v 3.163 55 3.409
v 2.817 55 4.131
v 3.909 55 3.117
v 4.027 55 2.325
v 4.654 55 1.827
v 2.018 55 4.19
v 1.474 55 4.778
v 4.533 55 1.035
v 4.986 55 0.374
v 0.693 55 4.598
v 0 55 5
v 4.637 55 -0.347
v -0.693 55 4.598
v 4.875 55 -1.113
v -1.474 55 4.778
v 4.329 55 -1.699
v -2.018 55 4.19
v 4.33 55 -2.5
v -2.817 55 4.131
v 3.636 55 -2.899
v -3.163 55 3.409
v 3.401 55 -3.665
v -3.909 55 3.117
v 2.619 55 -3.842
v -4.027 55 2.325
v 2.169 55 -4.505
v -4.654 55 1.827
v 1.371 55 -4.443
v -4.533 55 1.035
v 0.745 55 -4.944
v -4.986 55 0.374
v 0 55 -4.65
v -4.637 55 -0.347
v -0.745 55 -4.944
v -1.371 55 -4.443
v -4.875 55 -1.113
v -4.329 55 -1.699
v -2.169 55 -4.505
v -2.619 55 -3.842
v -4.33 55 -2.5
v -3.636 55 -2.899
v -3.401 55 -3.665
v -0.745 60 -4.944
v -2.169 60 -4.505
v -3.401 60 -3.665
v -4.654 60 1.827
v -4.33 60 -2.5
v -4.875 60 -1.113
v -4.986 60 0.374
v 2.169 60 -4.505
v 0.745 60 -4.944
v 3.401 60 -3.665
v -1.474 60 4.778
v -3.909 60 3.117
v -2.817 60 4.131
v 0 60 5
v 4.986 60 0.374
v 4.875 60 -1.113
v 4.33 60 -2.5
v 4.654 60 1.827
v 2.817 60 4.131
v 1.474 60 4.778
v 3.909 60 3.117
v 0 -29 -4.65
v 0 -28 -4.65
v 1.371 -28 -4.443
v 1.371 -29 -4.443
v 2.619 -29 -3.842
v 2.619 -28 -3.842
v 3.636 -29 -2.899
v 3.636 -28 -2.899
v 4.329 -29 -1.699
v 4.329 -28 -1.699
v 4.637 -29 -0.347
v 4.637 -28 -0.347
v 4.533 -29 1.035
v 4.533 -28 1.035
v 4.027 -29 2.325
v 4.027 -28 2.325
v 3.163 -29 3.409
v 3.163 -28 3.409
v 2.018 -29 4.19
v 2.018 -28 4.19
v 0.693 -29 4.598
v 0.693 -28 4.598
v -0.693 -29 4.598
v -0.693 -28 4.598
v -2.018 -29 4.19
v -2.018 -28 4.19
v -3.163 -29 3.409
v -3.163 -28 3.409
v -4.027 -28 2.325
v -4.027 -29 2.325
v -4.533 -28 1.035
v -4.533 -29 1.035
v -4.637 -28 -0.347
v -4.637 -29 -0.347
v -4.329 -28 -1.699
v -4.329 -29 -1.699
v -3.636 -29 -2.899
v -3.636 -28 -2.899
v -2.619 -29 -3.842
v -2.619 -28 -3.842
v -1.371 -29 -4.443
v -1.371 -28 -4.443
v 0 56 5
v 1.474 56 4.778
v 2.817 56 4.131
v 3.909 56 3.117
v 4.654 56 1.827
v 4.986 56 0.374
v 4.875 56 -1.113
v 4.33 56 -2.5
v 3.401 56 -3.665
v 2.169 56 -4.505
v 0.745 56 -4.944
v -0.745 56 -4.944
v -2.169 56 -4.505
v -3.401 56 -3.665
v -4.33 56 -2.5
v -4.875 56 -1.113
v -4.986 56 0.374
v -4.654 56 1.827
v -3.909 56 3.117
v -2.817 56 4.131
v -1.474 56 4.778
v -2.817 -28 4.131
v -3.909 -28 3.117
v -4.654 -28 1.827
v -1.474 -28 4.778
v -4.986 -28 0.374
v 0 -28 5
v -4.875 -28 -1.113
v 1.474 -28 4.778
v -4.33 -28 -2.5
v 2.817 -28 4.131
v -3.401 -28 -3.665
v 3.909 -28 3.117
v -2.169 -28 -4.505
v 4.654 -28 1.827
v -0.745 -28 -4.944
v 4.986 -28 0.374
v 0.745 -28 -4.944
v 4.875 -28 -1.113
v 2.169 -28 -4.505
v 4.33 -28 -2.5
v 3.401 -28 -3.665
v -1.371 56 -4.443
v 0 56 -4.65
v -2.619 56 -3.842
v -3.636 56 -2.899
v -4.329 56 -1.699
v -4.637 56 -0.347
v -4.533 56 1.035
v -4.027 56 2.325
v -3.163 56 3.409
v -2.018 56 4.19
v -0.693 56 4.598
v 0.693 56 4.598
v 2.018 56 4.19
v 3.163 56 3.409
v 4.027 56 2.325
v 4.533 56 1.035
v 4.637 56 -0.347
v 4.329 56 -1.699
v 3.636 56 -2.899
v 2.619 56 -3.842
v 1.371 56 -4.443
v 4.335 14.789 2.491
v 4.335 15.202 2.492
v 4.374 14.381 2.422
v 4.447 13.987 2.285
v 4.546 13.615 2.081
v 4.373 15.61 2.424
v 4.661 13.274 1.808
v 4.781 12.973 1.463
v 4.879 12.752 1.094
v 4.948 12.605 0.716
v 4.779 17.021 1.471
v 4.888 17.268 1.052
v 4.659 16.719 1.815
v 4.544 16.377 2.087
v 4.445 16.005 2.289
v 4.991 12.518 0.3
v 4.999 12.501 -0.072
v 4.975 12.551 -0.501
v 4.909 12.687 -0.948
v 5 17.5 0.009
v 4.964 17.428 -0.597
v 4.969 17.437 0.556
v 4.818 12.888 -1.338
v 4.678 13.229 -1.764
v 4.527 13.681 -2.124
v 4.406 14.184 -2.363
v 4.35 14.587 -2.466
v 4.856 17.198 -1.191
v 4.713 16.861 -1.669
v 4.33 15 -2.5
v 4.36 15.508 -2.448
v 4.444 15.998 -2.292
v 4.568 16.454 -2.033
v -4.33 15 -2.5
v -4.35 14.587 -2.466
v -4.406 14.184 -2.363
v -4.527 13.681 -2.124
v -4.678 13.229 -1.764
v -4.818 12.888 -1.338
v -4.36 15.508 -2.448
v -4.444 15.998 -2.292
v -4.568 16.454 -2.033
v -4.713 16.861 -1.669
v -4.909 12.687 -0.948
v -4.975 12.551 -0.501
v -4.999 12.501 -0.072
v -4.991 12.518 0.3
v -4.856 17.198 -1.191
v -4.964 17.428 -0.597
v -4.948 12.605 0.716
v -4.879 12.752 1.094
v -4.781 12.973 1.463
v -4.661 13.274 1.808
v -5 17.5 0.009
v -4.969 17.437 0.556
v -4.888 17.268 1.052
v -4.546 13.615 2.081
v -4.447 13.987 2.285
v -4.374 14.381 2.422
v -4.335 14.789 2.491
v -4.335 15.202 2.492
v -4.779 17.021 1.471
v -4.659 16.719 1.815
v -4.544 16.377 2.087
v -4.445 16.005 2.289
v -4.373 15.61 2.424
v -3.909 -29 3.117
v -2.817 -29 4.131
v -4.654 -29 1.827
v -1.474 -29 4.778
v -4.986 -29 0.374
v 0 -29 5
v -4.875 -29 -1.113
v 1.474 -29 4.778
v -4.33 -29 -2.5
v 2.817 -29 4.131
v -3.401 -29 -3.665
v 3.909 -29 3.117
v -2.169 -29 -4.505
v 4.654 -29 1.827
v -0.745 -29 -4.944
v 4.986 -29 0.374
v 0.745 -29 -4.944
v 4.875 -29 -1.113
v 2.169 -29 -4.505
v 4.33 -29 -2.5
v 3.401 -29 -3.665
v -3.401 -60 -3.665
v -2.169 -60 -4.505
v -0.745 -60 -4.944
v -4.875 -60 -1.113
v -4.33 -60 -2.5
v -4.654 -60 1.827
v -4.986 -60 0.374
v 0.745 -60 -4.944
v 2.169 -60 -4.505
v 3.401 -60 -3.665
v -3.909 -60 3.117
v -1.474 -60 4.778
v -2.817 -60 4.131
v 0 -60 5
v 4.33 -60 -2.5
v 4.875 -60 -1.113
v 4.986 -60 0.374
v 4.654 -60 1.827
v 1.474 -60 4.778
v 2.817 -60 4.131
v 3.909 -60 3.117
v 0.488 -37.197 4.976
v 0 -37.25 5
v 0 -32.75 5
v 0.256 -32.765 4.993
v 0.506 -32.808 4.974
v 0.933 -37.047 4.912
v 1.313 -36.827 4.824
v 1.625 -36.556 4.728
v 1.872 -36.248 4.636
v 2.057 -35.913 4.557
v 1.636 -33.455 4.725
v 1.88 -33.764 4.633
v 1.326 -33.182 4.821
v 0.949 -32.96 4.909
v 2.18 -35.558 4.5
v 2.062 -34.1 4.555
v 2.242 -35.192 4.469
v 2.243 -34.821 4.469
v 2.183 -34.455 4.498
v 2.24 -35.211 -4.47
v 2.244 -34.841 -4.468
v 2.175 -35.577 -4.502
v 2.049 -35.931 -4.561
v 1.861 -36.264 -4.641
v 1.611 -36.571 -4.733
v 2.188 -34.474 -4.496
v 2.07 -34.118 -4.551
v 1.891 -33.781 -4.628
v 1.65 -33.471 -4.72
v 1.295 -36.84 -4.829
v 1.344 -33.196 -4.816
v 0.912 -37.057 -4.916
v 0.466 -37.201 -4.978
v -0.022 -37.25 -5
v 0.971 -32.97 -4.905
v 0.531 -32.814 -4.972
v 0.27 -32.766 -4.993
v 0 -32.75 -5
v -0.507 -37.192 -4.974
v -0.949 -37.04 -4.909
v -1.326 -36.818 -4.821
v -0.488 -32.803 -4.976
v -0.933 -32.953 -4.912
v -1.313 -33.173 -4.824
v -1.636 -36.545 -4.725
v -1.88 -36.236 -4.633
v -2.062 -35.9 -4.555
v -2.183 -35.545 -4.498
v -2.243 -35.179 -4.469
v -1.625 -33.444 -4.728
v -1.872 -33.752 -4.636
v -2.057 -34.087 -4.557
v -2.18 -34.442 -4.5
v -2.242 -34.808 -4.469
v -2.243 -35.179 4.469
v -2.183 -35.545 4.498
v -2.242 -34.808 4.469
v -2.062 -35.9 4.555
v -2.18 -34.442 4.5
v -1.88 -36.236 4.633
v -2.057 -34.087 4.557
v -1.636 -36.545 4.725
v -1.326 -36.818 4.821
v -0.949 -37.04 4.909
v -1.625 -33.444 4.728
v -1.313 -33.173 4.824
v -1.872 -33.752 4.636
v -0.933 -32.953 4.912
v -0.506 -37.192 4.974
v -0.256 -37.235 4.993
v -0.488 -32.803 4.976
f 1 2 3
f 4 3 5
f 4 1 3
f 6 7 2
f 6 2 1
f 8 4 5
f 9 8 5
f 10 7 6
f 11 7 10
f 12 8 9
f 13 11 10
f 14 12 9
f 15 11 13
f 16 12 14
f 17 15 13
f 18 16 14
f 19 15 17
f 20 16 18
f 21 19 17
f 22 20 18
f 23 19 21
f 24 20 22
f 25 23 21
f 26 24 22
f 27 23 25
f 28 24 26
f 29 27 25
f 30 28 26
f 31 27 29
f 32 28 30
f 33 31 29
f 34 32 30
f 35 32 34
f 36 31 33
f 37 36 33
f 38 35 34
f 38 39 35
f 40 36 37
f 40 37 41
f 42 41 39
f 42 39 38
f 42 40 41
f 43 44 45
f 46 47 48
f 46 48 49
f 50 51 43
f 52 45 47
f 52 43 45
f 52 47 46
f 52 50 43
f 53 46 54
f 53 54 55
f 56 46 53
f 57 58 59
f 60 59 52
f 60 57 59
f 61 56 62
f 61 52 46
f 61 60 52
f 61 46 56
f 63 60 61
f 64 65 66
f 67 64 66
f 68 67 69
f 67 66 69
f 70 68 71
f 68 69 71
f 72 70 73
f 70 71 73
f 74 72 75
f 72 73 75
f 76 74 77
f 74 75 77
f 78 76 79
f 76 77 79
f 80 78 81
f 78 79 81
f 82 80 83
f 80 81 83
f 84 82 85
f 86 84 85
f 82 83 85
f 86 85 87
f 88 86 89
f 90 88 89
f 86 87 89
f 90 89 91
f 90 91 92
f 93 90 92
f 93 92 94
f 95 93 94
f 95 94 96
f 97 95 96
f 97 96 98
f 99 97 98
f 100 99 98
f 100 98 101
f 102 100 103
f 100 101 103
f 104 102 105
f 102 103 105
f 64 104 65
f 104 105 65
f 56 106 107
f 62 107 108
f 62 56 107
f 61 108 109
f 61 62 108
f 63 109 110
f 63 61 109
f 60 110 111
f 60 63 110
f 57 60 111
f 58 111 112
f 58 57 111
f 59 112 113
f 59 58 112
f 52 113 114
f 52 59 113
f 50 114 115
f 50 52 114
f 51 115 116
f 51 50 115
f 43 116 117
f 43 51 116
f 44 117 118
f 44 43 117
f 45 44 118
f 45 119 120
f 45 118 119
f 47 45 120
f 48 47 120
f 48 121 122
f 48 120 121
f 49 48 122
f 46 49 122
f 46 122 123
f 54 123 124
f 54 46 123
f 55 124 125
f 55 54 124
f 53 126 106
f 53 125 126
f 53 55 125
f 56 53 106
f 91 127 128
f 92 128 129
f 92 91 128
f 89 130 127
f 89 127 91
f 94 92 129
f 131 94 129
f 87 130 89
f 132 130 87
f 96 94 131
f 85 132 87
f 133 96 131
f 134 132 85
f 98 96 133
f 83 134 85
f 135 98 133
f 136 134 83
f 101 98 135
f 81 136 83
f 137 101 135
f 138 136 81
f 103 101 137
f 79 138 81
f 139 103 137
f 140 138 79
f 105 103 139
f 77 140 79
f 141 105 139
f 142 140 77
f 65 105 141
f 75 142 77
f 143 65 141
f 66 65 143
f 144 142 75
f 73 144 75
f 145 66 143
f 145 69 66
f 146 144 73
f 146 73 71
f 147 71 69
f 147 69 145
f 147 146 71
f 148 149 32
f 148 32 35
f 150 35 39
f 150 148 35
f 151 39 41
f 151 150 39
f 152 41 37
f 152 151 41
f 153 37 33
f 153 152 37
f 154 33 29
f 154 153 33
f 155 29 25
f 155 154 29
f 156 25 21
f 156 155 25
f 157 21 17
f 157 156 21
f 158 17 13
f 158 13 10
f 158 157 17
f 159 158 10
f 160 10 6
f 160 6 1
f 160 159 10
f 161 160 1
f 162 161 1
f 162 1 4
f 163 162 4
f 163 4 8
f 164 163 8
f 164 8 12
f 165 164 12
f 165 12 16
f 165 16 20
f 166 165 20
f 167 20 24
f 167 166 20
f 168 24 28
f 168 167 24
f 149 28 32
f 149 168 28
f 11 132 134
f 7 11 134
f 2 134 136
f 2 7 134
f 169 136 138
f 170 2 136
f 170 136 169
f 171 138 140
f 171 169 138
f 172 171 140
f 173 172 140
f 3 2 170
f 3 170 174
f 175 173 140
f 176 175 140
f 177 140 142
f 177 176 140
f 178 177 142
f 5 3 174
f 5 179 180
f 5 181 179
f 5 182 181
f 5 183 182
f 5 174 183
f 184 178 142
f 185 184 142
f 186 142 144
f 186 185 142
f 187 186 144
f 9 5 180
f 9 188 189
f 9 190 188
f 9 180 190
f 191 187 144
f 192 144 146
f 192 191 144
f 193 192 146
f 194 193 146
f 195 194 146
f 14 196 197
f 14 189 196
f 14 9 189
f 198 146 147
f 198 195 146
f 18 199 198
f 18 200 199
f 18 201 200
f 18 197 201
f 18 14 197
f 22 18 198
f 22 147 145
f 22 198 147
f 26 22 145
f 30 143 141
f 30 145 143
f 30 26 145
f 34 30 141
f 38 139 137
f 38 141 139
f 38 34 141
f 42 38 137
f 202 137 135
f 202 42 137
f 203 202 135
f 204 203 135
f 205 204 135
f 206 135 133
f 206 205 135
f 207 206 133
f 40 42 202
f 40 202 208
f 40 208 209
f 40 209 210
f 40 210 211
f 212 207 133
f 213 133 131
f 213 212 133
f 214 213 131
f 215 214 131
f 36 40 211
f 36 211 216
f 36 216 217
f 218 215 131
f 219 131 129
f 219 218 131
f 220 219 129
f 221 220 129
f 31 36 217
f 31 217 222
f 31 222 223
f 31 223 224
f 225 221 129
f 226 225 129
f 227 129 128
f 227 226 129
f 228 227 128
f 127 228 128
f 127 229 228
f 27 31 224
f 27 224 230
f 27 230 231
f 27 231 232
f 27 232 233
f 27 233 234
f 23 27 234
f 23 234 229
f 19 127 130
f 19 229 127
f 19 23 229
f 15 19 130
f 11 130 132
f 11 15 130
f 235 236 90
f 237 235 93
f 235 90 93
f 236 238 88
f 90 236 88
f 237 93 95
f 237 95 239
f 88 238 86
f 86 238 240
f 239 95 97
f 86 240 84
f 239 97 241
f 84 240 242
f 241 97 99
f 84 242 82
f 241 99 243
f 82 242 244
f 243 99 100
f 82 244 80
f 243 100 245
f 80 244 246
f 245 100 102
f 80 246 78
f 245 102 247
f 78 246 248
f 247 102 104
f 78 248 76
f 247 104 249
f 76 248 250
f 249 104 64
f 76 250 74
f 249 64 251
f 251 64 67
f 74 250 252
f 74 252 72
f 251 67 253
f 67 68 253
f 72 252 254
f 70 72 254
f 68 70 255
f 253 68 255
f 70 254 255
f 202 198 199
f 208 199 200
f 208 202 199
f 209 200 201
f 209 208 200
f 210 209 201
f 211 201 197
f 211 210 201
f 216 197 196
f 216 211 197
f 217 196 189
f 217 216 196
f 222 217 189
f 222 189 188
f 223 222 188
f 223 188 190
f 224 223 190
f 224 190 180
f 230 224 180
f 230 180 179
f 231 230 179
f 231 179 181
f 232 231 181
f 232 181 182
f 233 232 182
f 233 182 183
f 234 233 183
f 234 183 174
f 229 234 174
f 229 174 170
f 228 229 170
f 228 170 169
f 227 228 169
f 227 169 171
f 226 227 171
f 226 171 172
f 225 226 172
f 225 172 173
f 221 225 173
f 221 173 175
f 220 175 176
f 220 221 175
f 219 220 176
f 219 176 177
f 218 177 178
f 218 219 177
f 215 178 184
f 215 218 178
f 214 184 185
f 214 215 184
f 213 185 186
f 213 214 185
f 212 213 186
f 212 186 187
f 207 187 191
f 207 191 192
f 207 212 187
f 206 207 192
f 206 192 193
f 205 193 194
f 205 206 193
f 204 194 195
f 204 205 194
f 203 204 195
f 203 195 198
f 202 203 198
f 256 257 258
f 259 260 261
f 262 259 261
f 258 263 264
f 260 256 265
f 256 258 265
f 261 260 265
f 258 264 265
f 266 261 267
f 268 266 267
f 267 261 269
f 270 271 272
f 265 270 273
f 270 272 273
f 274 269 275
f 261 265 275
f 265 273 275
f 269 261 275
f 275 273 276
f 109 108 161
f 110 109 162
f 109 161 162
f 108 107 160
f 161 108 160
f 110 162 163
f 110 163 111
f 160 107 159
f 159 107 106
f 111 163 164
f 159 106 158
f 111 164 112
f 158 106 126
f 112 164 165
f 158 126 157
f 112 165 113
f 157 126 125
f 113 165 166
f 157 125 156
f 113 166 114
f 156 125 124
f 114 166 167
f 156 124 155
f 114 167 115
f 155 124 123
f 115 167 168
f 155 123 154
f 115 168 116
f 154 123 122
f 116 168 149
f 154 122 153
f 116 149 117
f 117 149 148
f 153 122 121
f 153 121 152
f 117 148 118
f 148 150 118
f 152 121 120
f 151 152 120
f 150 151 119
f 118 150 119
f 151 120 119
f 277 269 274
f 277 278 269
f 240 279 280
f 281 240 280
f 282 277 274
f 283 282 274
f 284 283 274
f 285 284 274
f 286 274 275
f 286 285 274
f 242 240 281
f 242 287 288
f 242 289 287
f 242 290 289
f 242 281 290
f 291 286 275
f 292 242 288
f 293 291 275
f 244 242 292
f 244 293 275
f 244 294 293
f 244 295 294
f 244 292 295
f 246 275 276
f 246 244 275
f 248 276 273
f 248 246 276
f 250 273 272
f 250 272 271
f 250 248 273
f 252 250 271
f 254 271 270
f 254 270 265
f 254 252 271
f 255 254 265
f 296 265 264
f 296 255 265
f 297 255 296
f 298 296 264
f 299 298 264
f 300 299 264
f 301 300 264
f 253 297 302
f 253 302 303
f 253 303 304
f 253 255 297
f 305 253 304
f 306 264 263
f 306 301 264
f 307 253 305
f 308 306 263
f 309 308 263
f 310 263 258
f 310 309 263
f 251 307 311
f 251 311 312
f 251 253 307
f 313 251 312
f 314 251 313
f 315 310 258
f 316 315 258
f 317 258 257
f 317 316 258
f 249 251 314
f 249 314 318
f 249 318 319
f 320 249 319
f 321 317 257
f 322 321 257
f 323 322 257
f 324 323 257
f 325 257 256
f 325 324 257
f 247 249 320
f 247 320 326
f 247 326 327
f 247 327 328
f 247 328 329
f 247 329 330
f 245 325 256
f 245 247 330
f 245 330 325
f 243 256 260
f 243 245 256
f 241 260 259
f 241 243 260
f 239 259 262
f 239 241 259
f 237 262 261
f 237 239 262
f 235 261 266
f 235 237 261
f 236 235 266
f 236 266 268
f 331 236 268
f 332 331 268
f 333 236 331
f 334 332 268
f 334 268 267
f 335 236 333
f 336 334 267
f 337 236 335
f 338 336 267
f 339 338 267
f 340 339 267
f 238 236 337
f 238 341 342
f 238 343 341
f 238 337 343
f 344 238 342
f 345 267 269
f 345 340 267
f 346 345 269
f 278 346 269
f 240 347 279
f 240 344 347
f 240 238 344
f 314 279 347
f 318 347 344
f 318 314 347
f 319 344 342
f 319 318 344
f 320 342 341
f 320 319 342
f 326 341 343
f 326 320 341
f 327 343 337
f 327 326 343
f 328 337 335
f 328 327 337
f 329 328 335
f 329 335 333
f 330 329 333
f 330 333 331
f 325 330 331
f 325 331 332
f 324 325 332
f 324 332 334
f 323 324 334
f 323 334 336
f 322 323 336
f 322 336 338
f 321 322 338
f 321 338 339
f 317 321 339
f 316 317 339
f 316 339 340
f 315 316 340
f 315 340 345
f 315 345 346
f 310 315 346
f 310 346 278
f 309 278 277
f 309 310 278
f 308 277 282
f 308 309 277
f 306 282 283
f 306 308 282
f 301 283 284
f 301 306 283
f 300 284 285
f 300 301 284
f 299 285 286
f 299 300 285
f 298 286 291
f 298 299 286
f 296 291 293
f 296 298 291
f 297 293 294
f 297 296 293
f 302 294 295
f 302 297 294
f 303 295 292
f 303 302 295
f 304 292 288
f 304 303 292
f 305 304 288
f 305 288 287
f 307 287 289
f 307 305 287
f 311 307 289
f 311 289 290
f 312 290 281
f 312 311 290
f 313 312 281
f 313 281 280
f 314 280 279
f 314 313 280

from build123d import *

# Parameters (mm, degrees)
SKETCH1_R               = 5
BOSS_EXTRUDE1_DEPTH     = 60
CUT_EXTRUDE2_DEPTH      = 61.415229868
CUT_EXTRUDE2_DEPTH_BACK = 61.415229868
SKETCH3_R               = 2.25
SKETCH4_R               = 5
SKETCH4_R_2             = 4.65
CUT_EXTRUDE3_DEPTH      = 1
CUT_EXTRUDE4_START      = 1
SKETCH5_R               = 5
SKETCH5_R_2             = 4.65
CUT_EXTRUDE4_DEPTH      = 1
CUT_EXTRUDE5_DEPTH      = 61.415229984
CUT_EXTRUDE5_DEPTH_BACK = 61.415229984
SKETCH6_R               = 2.5


with BuildPart() as part:
    # Sketch1 → Boss-Extrude1 (new, symmetric)
    with BuildSketch(Plane(origin=(0, 0, 0), x_dir=(1, 0, 0), z_dir=(0, 1, 0))):
        with Locations(Location((0, 0, 0), (0, 0, 270))):
            Circle(SKETCH1_R)
    extrude(amount=BOSS_EXTRUDE1_DEPTH, both=True)

    # Sketch3 → Cut-Extrude2 (cut, two sides: drawn at the far end of the back side and taken through both)
    with BuildSketch(Plane.XY.offset(-CUT_EXTRUDE2_DEPTH_BACK)):
        with Locations(Location((0, -35, 0), (0, 0, 89.999999993))):
            Circle(SKETCH3_R)
    extrude(amount=CUT_EXTRUDE2_DEPTH + CUT_EXTRUDE2_DEPTH_BACK, mode=Mode.SUBTRACT)

    # Sketch4 → Cut-Extrude3 (cut)
    with BuildSketch(Plane(origin=(0, -28, 0), x_dir=(-1, 0, 0), z_dir=(0, -1, 0))):
        with Locations(Location((0, 0, 0), (0, 0, 90))):
            Circle(SKETCH4_R)
        with Locations(Location((0, 0, 0), (0, 0, 90))):
            Circle(SKETCH4_R_2, mode=Mode.SUBTRACT)
    extrude(amount=CUT_EXTRUDE3_DEPTH, mode=Mode.SUBTRACT)

    # Sketch5 → Cut-Extrude4 (cut)
    with BuildSketch(Plane(origin=(0, 55, 0), x_dir=(1, 0, 0), z_dir=(0, 1, 0)).offset(CUT_EXTRUDE4_START)):
        with Locations(Location((0, 0, 0), (0, 0, 90))):
            Circle(SKETCH5_R)
        with Locations(Location((0, 0, 0), (0, 0, 90))):
            Circle(SKETCH5_R_2, mode=Mode.SUBTRACT)
    extrude(amount=-CUT_EXTRUDE4_DEPTH, mode=Mode.SUBTRACT)

    # Sketch6 → Cut-Extrude5 (cut, two sides: drawn at the far end of the back side and taken through both)
    with BuildSketch(Plane(origin=(0, 0, 0), x_dir=(0, 0, -1), z_dir=(1, 0, 0)).offset(-CUT_EXTRUDE5_DEPTH_BACK)):
        with Locations((0, 15)):
            Circle(SKETCH6_R)
    extrude(amount=CUT_EXTRUDE5_DEPTH + CUT_EXTRUDE5_DEPTH_BACK, mode=Mode.SUBTRACT)


solid = part.part
